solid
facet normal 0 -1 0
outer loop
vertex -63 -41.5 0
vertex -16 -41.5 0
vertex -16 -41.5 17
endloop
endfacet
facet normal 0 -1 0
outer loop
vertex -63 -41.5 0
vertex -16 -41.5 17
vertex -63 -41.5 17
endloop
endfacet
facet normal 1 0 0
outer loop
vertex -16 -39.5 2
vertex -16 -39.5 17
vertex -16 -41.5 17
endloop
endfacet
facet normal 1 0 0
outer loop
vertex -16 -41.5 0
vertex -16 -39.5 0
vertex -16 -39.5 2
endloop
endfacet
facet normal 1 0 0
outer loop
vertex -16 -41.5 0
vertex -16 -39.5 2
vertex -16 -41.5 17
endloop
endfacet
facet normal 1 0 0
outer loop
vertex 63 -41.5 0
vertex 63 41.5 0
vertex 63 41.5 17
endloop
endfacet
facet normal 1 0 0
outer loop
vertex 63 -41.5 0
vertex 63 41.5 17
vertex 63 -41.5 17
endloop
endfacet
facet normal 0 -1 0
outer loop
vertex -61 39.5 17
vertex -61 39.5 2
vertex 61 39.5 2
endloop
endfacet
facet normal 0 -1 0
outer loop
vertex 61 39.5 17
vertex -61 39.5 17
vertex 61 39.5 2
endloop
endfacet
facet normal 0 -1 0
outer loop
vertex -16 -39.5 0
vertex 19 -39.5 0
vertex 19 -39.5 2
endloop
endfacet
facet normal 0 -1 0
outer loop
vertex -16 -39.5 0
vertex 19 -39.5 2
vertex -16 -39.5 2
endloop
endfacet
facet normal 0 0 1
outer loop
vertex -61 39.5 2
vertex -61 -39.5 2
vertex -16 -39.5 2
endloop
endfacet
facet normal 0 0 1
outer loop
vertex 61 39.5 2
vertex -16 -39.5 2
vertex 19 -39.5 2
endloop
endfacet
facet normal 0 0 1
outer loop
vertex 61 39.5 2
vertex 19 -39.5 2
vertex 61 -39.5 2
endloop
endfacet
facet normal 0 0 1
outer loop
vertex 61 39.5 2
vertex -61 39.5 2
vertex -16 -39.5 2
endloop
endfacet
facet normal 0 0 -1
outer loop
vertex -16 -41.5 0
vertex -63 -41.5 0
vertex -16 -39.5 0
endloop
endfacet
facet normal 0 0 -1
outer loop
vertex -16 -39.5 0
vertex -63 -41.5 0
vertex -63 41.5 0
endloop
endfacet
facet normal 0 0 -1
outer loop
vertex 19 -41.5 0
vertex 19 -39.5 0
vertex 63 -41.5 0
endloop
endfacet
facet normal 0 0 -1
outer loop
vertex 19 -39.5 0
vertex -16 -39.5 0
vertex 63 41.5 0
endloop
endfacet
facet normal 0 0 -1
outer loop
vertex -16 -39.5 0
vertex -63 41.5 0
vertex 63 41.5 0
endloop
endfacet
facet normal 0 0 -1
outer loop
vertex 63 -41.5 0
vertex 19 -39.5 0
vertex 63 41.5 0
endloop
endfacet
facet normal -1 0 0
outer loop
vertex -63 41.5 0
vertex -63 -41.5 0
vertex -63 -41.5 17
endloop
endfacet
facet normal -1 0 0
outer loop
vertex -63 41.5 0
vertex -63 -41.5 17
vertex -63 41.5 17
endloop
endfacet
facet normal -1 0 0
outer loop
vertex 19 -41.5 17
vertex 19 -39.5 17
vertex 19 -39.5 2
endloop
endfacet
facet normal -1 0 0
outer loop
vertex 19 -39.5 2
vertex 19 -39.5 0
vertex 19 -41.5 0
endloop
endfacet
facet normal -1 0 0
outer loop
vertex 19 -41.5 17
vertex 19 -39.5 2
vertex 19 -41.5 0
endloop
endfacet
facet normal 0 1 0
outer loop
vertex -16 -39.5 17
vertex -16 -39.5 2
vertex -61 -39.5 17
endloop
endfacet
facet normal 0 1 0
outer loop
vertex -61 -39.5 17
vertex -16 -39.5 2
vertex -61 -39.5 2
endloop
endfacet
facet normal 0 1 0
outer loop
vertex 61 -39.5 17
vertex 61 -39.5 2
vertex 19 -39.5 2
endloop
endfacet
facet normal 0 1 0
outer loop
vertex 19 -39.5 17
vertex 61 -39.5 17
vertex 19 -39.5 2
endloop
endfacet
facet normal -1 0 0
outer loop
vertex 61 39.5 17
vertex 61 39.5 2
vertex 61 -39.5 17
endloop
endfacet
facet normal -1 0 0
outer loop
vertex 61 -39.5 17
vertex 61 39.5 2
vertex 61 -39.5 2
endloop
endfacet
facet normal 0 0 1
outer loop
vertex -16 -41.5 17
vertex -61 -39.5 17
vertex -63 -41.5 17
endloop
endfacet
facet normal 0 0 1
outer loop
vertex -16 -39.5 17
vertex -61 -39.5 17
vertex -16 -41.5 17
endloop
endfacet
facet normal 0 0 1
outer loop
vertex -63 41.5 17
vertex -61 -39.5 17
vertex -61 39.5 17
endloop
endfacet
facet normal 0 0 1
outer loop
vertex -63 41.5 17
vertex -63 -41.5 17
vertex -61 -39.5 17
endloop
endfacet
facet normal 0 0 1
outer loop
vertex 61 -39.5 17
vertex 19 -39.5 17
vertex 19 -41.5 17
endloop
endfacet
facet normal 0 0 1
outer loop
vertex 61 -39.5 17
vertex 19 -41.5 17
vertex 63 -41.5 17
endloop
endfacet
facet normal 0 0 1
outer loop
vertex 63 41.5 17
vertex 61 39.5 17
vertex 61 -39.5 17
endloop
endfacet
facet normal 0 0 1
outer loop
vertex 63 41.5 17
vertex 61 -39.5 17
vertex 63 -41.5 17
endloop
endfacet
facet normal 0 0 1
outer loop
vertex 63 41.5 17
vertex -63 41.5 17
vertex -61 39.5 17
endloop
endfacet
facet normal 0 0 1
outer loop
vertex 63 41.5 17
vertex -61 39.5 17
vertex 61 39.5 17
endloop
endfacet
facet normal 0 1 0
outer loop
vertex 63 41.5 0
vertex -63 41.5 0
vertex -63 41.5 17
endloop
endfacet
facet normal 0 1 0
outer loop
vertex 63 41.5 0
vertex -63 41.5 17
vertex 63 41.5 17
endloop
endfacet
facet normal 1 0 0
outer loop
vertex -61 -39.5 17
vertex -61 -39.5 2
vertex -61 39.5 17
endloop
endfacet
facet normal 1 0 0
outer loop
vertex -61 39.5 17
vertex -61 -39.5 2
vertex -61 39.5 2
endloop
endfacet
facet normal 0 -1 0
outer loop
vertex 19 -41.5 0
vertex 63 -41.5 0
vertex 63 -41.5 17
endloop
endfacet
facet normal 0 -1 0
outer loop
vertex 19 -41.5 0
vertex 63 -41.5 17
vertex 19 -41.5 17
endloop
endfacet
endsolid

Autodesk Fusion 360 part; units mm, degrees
sketch "Sketch1" plane through (0, 0, 0) normal (0, 0, 1) x (1, 0, 0) in component "stand"
  line L0 (61, -39.5) -> (-61, -39.5)
  line L1 (-61, -39.5) -> (-61, 39.5)
  line L2 (-61, 39.5) -> (61, 39.5)
  line L3 (61, 39.5) -> (61, -39.5)
  line L4 (61, -39.5) -> (-61, 39.5) construction
  line L5 (-61, -39.5) -> (61, 39.5) construction
  line L6 (63, -41.5) -> (-63, -41.5)
  line L7 (-63, -41.5) -> (-63, 41.5)
  line L8 (-63, 41.5) -> (63, 41.5)
  line L9 (63, 41.5) -> (63, -41.5)
  line L10 (-61, 0) -> (-16, 0)
  line L11 (-61, 0) -> (19, 0)
  line L12 (-16, 0) -> (-16, -41.5)
  line L13 (19, 0) -> (19, -41.5)
  line L14 (-61, 39.5) -> (61, 39.5)
  line L15 (-61, 0) -> (19, 0)
  line L16 (-63, 41.5) -> (63, 41.5)
  line L17 (-63, -41.5) -> (-63, 41.5)
  line L18 (-61, 0) -> (-16, 0)
  line L19 (63, 41.5) -> (63, -41.5)
  line L20 (61, 39.5) -> (61, -39.5)
  line L21 (-16, 0) -> (-16, -41.5)
  line L22 (61, -39.5) -> (-61, -39.5)
  line L23 (63, -41.5) -> (-63, -41.5)
  line L24 (-61, -39.5) -> (-61, 39.5)
  line L25 (61, -39.5) -> (-61, 39.5) construction
  line L26 (19, 0) -> (19, -41.5)
  line L27 (-61, -39.5) -> (61, 39.5) construction
  dimension "d1" = 122
  dimension "d2" = 79
  dimension "d3" = -2
  dimension "d4" = 45
  dimension "d5" = 80
  dimension "d10" = -2
  dimension "d11" = 122
  dimension "d12" = 79
  dimension "d13" = 45
  dimension "d14" = 80
extrude "Extrude1" add sketch "Sketch1" along normal blind 17 contours L0 L1 L2 L3 L6 L7 L8 L9 L12 L13 L14 L16 L17 L19 L20 L21 L22 L23 L24 L26 in component "stand"
extrude "Extrude2" add sketch "Sketch1" along normal blind 2 contours L0 L1 L2 L3 L10 L11 L13 L14 L15 L18 L20 L22 L24 L26 | L0 L11 L12 L13 L15 L21 L22 L26 | L0 L1 L10 L11 L12 L15 L18 L21 L22 L24 in component "stand"
component "stand" placed x (1, 0, 0) y (0, 1, 0) z (0, 0, 1) at (0, 0, 0)
